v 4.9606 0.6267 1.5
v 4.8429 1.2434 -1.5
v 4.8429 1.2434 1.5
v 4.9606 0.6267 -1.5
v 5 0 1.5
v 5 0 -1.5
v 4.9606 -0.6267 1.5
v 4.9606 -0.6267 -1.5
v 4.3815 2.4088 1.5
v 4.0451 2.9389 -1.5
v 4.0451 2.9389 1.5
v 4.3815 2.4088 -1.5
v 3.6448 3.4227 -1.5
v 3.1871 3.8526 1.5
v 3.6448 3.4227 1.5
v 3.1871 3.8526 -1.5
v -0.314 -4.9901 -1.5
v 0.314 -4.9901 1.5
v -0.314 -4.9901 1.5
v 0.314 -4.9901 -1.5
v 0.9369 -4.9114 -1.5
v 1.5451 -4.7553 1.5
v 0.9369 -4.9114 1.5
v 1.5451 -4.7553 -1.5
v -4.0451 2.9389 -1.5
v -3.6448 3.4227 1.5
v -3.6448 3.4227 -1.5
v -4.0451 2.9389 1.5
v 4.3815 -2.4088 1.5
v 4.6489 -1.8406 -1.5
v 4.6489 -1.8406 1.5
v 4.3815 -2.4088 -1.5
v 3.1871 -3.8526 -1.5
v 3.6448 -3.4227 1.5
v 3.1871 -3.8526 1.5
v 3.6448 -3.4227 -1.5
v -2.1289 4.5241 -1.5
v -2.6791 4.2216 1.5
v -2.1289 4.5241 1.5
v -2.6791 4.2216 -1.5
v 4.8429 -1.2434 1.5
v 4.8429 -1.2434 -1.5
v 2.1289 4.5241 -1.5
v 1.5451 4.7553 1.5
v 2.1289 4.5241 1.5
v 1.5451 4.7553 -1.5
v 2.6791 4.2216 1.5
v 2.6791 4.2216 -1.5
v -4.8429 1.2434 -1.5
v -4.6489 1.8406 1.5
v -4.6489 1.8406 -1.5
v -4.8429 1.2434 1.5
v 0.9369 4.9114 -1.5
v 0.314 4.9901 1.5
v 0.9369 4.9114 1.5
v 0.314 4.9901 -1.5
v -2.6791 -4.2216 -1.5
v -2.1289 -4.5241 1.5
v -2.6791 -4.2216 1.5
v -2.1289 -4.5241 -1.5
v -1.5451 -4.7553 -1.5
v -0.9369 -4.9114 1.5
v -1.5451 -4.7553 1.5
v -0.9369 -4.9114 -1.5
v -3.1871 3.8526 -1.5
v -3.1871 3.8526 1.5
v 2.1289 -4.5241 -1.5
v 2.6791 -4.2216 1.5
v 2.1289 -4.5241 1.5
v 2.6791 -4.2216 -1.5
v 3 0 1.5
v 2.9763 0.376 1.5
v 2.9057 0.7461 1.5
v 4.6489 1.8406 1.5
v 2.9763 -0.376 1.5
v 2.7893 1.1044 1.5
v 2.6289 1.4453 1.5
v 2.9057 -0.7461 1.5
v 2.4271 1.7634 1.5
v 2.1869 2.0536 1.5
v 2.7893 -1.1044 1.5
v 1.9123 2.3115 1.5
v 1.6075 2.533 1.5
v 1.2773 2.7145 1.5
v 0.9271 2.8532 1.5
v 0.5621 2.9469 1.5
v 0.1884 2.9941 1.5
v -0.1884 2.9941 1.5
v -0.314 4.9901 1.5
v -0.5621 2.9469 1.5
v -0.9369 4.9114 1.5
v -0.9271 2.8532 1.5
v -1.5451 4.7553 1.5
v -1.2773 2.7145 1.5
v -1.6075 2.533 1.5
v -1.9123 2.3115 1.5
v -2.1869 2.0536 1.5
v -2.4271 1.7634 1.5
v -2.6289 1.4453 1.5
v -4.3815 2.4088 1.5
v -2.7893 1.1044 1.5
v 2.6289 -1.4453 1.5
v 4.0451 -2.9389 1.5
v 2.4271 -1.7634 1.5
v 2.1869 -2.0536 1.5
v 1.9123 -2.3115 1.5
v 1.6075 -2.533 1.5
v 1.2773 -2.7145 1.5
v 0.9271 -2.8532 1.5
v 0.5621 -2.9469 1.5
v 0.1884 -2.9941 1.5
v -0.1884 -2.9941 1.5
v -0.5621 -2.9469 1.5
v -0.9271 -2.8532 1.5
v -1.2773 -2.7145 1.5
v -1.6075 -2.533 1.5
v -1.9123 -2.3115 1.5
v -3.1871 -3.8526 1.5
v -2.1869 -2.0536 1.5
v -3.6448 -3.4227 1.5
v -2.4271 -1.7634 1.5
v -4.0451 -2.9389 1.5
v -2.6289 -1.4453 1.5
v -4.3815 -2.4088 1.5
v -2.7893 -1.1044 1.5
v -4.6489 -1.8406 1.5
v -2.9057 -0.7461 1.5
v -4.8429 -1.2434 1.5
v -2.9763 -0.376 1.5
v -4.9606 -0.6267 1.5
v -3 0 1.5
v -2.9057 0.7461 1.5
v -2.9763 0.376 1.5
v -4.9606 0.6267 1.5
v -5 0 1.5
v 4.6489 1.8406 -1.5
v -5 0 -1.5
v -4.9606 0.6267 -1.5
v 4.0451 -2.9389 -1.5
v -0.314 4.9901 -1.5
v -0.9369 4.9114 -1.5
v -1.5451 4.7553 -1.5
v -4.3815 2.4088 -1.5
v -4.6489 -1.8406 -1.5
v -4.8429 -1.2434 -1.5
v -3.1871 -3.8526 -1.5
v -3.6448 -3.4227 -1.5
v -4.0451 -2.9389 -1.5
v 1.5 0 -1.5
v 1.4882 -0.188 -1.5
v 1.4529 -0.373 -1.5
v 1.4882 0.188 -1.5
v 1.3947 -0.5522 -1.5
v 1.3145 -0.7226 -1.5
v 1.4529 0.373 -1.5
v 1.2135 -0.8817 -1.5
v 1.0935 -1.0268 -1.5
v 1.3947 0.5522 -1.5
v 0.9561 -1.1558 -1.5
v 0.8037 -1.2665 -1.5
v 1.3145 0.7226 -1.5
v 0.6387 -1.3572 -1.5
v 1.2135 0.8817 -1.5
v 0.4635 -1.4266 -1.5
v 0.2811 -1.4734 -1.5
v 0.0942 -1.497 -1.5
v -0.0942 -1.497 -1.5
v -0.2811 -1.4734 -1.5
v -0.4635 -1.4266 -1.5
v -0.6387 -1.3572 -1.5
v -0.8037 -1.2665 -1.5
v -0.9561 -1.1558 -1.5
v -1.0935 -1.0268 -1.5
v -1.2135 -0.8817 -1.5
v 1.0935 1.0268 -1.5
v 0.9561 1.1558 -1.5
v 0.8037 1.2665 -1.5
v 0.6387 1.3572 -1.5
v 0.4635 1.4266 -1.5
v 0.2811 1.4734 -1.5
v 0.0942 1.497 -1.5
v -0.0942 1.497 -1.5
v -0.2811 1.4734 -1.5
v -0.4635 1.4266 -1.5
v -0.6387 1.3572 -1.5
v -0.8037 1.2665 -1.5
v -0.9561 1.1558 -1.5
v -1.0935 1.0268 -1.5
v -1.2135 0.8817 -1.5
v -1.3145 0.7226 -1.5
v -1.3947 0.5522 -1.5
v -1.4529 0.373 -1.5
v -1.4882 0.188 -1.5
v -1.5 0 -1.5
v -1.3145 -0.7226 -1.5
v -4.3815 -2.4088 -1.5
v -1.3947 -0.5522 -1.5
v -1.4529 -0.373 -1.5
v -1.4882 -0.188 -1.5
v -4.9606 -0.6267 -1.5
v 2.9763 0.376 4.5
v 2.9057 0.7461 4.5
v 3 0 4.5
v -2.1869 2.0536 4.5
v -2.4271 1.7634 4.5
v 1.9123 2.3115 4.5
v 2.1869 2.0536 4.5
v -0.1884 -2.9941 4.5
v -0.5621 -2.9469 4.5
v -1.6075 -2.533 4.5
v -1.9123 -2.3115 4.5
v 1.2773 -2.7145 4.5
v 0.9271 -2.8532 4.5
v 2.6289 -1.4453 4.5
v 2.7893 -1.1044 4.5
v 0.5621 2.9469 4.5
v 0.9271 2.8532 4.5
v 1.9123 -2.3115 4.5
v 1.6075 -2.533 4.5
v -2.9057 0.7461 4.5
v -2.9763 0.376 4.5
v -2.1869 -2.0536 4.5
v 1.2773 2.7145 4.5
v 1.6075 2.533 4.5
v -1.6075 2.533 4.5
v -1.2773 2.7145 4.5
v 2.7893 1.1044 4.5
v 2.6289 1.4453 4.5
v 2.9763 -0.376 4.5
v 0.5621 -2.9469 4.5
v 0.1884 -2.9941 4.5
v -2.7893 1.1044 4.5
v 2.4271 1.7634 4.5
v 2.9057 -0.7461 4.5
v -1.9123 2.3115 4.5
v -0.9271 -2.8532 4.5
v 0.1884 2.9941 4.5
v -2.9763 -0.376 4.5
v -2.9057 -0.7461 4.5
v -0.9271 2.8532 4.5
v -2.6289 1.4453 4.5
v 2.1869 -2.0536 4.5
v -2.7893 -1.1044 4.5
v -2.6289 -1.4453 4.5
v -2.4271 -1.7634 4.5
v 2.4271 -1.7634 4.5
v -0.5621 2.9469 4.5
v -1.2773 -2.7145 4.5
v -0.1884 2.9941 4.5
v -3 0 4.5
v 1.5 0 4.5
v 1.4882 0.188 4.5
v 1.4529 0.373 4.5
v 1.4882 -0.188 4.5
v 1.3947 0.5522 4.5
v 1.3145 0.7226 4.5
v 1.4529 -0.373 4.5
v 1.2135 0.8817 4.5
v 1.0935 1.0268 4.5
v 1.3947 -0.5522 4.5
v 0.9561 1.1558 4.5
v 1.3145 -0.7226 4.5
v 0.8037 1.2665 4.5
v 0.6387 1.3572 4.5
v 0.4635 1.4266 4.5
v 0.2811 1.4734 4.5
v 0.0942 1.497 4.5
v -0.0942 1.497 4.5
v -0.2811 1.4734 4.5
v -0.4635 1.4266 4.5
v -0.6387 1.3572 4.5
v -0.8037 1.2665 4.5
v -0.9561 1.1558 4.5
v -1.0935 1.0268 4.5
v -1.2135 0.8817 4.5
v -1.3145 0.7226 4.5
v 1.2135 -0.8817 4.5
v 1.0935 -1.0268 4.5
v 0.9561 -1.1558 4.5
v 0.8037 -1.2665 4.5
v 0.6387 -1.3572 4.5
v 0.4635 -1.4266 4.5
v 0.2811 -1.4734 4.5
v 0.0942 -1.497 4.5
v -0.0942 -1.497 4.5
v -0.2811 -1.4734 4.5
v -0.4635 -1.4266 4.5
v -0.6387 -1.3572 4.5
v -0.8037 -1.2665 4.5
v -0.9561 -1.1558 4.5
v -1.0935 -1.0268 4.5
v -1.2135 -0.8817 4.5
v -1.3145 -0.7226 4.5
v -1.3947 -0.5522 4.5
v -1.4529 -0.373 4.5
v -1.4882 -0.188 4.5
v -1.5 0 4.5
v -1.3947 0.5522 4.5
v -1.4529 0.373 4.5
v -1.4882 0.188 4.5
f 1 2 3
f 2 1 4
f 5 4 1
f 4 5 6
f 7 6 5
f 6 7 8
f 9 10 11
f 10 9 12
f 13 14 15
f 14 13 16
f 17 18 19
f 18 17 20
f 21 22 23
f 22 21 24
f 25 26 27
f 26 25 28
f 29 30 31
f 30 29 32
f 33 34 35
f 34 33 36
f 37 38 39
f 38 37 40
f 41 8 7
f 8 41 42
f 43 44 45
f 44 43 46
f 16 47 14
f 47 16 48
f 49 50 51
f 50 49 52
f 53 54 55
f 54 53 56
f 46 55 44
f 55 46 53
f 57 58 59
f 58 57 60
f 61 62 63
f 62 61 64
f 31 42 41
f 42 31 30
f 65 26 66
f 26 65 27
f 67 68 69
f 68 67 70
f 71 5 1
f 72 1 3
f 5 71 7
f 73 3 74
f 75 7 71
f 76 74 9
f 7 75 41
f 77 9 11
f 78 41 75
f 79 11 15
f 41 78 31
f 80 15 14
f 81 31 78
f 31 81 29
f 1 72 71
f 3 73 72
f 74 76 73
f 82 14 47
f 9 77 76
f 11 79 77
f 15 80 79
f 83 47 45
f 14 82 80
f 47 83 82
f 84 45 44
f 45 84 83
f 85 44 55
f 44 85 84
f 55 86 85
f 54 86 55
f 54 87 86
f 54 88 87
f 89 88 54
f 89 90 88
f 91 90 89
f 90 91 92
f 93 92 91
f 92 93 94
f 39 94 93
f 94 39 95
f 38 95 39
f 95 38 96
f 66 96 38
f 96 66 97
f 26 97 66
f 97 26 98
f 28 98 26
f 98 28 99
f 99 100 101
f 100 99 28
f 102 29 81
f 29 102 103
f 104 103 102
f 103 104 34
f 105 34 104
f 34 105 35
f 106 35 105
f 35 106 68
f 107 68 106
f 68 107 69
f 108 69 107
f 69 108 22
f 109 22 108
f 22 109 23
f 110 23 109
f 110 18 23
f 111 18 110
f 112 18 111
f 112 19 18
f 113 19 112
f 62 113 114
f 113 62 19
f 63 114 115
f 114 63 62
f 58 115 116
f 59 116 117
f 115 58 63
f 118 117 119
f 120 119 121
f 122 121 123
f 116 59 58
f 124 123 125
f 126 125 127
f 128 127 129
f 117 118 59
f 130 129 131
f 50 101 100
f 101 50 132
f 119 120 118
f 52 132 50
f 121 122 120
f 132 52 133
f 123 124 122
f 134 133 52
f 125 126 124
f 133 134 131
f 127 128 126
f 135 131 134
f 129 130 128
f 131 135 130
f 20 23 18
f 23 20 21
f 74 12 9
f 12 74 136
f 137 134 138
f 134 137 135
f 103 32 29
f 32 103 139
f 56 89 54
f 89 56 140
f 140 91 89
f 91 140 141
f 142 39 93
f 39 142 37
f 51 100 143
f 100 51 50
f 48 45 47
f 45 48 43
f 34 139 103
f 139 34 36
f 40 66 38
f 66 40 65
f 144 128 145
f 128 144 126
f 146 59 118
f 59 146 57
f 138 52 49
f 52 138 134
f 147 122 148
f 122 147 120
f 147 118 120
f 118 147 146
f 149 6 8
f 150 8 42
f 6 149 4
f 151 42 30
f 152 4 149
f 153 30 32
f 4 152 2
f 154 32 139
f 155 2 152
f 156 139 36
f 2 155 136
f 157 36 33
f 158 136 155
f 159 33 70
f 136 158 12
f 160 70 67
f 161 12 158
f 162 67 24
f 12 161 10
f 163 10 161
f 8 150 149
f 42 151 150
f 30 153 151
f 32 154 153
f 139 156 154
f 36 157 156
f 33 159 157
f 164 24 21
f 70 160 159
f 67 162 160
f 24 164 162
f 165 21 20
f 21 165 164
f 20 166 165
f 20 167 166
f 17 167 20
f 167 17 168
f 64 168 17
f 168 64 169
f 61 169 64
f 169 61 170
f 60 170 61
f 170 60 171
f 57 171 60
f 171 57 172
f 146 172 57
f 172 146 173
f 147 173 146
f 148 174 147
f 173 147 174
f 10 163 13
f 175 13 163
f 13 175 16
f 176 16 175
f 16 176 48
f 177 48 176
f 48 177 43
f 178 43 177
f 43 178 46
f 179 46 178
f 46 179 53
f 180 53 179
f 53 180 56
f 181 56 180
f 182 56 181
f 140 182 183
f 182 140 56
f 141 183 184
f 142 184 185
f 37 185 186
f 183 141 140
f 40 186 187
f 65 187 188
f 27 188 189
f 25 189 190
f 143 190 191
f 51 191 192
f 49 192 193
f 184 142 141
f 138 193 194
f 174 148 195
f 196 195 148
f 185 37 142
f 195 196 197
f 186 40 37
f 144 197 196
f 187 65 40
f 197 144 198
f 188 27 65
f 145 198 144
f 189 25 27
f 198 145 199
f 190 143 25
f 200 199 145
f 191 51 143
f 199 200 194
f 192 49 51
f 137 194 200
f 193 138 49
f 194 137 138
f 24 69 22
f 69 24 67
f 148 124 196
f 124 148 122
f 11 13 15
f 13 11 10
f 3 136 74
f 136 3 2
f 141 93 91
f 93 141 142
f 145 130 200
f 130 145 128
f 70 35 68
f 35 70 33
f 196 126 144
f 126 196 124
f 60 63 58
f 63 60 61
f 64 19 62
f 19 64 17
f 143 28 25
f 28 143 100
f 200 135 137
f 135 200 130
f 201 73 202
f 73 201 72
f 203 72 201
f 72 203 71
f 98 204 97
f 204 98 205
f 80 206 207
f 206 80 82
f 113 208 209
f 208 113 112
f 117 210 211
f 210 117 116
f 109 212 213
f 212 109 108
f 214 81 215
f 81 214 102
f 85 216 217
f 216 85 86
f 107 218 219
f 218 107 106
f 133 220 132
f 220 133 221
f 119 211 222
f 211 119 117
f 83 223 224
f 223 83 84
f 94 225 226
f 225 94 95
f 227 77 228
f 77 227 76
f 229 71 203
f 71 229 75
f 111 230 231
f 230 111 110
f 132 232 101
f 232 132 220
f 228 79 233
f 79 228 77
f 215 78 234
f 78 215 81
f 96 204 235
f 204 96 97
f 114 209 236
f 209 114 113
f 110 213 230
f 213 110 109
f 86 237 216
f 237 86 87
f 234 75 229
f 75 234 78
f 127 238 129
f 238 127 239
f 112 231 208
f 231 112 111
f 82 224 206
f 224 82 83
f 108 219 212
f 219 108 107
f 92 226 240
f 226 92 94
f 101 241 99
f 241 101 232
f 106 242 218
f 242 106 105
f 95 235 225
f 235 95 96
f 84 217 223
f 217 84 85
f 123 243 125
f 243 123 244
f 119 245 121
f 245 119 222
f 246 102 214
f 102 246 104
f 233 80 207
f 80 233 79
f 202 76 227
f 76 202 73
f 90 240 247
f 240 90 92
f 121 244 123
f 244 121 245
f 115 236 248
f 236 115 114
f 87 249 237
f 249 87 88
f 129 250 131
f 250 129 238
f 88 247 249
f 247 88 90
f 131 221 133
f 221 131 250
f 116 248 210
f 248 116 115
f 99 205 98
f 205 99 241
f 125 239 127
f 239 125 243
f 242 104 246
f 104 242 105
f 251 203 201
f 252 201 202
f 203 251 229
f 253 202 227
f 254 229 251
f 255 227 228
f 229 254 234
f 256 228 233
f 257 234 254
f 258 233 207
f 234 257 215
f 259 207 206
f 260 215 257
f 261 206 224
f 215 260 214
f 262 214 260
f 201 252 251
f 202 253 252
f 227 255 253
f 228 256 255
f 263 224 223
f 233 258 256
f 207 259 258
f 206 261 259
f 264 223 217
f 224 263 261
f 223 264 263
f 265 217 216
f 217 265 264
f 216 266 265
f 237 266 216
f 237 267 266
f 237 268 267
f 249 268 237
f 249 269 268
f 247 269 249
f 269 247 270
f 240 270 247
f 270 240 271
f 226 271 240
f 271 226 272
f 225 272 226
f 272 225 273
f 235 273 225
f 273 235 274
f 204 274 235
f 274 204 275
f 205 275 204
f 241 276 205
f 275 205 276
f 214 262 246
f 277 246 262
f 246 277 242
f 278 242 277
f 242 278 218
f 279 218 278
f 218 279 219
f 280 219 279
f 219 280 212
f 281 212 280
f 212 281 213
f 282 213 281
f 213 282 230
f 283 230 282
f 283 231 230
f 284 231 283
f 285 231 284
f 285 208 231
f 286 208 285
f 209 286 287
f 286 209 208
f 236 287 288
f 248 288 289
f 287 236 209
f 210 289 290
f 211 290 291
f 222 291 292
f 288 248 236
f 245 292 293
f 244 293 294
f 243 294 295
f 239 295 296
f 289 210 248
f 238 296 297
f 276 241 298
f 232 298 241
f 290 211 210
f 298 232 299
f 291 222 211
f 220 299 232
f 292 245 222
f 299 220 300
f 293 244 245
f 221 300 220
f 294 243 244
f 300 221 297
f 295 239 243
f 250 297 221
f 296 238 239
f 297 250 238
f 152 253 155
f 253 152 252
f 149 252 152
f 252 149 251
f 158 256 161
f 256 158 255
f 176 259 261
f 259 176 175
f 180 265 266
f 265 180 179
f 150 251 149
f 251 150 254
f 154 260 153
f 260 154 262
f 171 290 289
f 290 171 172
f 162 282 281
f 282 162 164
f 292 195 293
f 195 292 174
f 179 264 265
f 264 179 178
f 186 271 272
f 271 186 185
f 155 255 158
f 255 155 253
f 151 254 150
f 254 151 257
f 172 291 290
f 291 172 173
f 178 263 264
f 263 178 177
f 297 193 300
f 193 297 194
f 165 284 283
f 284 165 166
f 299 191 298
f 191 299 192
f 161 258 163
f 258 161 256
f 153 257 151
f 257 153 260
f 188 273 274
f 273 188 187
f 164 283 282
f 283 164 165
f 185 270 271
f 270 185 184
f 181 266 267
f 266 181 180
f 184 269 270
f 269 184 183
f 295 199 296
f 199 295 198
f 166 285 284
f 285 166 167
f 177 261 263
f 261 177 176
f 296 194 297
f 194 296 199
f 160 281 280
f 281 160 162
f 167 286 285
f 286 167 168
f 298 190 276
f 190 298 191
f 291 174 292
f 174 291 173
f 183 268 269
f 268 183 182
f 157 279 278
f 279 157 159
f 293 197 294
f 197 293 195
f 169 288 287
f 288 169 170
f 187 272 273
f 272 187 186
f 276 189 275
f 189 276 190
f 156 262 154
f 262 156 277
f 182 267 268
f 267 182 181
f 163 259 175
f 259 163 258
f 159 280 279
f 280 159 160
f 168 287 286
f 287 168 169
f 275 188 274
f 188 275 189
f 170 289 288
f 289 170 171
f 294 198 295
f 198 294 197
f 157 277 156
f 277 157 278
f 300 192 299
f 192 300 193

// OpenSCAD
$fn = 50;


difference() {
	union() {
		translate(v = [0, 0, -1.5000000000]) {
			cylinder(h = 3, r = 5.0000000000);
		}
		translate(v = [0, 0, -1.5000000000]) {
			cylinder(h = 6, r = 3.0000000000);
		}
	}
	union() {
		translate(v = [0, 0, -100.0000000000]) {
			cylinder(h = 200, r = 1.5000000000);
		}
	}
}
